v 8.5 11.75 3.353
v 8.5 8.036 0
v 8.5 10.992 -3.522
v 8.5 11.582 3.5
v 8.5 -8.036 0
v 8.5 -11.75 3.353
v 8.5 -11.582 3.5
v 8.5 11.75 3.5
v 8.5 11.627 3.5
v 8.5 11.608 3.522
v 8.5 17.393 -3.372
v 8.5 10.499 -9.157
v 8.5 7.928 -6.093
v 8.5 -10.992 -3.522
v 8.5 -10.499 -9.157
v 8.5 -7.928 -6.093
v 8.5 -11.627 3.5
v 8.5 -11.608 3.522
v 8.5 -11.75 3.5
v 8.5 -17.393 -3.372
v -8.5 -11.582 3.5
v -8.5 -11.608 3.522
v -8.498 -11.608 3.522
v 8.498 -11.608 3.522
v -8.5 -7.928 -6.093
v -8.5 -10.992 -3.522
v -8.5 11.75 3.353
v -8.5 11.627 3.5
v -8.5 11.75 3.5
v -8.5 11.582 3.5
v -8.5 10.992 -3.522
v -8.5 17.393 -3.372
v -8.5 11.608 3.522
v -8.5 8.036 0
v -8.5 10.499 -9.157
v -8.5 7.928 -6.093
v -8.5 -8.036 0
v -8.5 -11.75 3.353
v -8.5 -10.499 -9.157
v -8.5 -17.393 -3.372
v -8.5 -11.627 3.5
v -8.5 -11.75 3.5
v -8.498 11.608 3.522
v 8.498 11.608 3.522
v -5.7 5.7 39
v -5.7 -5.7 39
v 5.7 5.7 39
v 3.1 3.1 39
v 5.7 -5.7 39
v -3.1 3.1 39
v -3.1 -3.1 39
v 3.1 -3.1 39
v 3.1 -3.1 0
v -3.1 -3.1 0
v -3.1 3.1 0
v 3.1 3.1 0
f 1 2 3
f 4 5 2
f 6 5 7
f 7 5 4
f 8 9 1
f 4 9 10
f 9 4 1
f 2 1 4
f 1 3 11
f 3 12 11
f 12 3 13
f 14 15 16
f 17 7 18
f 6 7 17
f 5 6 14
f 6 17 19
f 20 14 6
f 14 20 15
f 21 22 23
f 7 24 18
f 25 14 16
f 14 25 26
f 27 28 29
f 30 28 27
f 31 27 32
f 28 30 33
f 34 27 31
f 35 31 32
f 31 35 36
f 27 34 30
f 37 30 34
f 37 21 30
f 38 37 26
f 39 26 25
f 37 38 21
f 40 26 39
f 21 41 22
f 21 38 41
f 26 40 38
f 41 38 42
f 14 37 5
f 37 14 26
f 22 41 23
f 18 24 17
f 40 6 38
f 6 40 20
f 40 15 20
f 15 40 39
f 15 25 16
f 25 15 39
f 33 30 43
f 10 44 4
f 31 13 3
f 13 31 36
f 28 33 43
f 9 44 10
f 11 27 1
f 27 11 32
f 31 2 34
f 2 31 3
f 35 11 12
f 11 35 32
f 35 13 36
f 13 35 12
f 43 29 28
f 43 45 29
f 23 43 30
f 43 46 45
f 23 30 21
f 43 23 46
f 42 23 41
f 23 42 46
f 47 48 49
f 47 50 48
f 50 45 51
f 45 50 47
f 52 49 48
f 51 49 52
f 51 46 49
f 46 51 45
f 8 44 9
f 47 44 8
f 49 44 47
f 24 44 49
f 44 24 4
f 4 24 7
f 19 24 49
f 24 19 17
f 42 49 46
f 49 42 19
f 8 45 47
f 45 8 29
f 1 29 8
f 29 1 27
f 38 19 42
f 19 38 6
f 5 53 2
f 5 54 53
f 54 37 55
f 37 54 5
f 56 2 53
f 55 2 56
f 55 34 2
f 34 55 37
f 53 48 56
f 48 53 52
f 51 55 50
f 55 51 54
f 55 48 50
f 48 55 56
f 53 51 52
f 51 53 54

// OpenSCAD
//
// stampholder_picrail.scad
// A stamp holder, for e.g. Tekton, over a Picatinny rail, like on Polymer80
//
// Professional gunmakers use a stamp press in order to make precise
// impressions. But DIY hobbyists and casual makers may not have access
// to such equipment. Extremely dexterous people simply hit stamp with
// a hammer. However, in this case, because any alterations to the number
// plate are a felony, it is impossible to correct mistakes. It is much
// safer to use this tool and a clamp for your next Polymer80 build.
// 

tower_h = 39.0;
claw_x = 17.0;

module the_outer_mold () {

    hull () {

        // The tower for the stamp
        translate([0, 0, tower_h/2])
            cube([11.4, 11.4, tower_h], center=true);

        // Base
        translate([0, 0, 3.5/2])
            cube([claw_x, 23.5, 3.5], center=true);
    }

    // One claw
    translate([0, -11.3, 0])
        rotate(-40, [1,0,0]) {
            cube([claw_x, 5.0, 5.0], center=true);
            translate([0, (9.0/2 - 5.0/2), (5.0/2 + 4.0/2)*-1])
                cube([claw_x, 9.0, 4.0], center=true);
        }

    // Other claw
    translate([0, 11.3, 0])
        rotate(40, [1,0,0]) {
            cube([claw_x, 5.0, 5.0], center=true);
            translate([0, (9.0/2 - 5.0/2)*-1, (5.0/2 + 4.0/2)*-1])
                cube([claw_x, 9.0, 4.0], center=true);
        }

}

module the_holder () {
    difference () {
        the_outer_mold();

        translate([0, 0, tower_h/2])
            cube([6.2, 6.2, tower_h + 0.2], center=true);
    }
}

the_holder();
